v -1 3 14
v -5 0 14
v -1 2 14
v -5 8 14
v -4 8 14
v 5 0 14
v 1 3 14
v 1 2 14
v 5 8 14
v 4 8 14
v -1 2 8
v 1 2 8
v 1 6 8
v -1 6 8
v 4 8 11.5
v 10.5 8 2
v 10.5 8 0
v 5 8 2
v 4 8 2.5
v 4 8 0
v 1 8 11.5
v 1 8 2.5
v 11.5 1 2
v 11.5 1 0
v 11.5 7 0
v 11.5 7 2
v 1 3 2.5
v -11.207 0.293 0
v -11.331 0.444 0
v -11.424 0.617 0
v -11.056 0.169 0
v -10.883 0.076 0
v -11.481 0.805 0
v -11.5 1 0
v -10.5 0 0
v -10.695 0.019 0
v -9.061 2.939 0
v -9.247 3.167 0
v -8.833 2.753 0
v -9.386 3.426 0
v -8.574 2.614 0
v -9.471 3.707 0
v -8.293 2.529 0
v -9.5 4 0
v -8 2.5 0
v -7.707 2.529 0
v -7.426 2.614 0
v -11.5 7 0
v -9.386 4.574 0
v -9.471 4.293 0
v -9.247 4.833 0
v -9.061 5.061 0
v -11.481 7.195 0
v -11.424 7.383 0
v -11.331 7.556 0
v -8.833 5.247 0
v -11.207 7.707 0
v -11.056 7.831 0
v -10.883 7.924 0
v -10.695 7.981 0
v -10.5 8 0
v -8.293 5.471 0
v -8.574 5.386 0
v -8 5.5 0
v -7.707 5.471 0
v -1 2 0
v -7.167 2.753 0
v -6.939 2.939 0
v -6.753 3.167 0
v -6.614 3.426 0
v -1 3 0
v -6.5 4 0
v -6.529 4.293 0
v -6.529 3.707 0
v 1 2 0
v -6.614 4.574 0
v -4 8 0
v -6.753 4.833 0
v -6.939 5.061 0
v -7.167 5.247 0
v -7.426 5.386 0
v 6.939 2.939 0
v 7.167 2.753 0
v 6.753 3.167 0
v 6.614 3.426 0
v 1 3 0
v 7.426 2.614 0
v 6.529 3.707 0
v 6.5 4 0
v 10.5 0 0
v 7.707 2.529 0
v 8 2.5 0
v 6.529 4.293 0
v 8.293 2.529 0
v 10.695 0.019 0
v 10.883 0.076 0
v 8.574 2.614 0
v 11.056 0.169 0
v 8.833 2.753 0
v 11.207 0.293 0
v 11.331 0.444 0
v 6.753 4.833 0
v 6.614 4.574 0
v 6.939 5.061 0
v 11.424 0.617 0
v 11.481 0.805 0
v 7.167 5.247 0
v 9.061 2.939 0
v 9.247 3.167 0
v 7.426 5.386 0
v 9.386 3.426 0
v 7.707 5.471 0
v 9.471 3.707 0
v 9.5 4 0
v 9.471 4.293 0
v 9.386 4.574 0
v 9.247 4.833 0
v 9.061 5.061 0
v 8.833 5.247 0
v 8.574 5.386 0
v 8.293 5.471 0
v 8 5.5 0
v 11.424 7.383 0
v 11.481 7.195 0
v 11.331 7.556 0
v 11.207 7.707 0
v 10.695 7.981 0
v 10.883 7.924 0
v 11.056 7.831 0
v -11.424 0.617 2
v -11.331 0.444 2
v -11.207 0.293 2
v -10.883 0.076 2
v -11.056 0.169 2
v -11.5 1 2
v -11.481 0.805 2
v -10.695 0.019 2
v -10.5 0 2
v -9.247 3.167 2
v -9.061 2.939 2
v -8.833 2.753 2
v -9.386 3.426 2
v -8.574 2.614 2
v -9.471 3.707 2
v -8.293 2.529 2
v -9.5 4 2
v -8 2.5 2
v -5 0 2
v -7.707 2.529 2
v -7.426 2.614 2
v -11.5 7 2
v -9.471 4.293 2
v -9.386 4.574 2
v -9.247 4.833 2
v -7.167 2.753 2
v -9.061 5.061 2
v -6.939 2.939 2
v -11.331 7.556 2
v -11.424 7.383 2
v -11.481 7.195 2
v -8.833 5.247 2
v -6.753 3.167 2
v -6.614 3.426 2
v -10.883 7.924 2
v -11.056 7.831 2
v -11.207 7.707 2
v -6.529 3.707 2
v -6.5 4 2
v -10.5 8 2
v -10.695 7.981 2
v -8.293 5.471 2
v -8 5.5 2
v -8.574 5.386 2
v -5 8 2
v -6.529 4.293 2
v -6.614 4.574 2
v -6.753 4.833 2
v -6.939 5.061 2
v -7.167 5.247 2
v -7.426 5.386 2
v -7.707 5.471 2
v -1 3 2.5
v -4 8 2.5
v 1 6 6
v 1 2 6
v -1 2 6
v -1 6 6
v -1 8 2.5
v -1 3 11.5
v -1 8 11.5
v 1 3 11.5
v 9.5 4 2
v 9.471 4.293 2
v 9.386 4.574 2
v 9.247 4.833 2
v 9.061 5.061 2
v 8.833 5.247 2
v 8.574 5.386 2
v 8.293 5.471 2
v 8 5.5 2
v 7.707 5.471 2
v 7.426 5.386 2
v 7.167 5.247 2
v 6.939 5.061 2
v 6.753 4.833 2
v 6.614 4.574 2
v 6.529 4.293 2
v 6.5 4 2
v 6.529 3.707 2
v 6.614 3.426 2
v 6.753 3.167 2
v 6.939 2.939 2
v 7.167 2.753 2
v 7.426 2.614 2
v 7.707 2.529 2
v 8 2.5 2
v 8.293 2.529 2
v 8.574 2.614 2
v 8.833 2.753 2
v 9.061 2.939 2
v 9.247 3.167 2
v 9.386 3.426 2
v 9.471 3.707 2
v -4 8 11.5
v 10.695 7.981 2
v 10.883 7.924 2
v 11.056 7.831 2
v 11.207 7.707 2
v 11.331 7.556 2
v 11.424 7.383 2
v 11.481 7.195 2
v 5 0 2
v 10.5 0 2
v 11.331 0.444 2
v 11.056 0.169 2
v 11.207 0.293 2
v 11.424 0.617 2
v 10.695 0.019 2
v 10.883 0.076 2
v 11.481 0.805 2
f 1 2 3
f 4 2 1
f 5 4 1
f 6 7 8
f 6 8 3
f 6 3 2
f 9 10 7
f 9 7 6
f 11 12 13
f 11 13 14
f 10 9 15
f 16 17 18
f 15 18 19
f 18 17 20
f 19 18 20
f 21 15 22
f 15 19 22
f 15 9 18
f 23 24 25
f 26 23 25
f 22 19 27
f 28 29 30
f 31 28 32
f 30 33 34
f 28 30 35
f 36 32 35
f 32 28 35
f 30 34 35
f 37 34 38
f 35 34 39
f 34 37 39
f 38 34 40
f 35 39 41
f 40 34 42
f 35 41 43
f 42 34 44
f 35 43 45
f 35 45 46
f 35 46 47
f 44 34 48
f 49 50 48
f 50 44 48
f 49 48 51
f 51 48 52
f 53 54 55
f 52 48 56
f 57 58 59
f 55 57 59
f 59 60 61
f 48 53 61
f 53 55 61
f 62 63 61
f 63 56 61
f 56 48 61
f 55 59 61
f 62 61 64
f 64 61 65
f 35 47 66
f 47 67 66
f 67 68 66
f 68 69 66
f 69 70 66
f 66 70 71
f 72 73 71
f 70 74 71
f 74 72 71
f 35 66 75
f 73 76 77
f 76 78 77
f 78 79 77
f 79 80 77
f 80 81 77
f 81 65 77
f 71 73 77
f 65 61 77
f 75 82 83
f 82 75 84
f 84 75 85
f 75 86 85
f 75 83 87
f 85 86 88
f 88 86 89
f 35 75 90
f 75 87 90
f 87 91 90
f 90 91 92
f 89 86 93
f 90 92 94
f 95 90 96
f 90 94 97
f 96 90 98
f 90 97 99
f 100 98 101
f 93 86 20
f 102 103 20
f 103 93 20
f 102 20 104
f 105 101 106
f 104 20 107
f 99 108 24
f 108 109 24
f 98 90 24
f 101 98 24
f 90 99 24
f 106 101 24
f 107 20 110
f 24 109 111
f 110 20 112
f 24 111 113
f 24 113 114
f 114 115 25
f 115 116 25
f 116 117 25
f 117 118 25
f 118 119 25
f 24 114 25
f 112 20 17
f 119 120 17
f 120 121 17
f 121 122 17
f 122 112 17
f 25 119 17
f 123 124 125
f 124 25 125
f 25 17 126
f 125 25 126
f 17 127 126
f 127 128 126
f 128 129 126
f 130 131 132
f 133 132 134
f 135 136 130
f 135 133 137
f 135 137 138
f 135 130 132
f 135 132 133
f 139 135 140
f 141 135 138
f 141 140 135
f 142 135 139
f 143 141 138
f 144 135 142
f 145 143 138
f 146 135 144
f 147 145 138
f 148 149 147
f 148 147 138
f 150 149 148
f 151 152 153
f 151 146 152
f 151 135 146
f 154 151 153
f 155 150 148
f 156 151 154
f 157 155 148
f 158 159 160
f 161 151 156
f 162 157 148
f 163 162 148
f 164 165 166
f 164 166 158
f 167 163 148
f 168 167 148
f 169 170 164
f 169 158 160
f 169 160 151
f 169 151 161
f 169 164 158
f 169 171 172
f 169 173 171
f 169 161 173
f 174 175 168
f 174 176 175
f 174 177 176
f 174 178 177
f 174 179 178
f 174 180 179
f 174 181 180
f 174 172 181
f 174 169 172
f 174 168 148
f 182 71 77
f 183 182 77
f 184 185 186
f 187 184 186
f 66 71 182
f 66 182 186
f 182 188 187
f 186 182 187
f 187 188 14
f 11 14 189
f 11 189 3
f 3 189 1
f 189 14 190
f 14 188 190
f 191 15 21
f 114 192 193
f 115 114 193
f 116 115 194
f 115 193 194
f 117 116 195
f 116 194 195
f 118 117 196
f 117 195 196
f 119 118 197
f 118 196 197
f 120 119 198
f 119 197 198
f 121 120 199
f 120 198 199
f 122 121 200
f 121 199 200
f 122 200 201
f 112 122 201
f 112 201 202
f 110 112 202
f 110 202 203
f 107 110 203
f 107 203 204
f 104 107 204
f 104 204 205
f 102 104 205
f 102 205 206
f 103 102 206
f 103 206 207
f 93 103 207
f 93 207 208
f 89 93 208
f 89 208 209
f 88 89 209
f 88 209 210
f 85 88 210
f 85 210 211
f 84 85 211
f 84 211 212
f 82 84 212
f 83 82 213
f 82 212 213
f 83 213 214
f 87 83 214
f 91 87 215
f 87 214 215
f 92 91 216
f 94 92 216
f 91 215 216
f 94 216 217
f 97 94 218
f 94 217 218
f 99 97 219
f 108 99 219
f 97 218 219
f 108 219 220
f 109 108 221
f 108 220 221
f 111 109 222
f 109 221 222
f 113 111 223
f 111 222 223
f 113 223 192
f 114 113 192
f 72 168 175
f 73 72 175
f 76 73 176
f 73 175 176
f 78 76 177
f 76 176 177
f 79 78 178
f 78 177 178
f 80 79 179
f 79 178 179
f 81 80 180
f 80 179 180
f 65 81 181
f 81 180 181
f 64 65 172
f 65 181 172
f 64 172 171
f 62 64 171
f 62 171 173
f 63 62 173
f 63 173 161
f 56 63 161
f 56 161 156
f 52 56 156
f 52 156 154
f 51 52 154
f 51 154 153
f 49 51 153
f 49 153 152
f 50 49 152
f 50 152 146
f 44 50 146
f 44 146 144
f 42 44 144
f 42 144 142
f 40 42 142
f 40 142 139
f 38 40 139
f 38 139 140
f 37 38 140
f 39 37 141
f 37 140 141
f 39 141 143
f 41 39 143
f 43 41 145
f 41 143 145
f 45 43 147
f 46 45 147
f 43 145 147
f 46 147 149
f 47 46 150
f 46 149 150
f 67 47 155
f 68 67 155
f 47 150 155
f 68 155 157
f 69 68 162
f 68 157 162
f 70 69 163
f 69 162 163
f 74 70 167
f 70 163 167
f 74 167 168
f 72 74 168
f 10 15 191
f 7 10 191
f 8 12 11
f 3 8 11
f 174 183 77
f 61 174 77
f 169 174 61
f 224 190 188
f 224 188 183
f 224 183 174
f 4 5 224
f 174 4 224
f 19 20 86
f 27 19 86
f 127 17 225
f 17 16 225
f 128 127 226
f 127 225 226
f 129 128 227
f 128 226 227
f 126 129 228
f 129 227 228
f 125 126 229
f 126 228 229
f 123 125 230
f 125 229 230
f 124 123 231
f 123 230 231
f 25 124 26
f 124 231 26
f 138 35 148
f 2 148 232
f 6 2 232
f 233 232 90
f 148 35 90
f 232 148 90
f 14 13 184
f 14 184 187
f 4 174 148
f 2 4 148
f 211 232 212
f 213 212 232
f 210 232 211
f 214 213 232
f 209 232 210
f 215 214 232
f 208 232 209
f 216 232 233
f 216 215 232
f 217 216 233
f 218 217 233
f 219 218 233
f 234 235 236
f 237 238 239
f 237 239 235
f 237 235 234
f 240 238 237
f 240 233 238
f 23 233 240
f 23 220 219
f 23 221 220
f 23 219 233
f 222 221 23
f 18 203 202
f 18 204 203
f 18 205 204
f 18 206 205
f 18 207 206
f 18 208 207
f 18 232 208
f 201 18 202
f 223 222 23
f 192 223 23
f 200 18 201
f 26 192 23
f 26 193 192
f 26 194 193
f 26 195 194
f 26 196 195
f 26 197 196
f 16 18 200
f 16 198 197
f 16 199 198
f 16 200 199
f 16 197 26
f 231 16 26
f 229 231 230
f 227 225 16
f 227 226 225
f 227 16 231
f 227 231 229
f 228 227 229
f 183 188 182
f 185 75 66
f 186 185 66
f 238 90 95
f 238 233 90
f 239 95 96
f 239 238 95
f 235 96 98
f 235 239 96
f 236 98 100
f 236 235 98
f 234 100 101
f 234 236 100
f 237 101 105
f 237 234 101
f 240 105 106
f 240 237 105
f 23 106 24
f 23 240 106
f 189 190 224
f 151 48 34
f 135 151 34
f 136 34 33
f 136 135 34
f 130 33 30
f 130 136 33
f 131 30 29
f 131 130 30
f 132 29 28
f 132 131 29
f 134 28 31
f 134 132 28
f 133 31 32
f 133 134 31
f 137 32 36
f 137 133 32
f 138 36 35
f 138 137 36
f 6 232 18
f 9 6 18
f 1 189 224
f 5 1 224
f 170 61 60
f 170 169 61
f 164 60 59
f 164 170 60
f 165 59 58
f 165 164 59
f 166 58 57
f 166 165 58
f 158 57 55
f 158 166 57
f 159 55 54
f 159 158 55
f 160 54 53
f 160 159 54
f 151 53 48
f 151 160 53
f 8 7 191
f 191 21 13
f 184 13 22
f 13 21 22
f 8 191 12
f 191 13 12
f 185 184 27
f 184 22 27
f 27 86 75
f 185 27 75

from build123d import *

# Parameters (mm, degrees)
F1_DEPTH  = 2
F3_DEPTH  = 25
F4_R      = 1.5
F5_DEPTH  = 25
F7_DEPTH  = 12
F8_W      = 3
F8_H      = 9
F9_DEPTH  = 8
F10_W     = 2
F10_H     = 2
F11_DEPTH = 4
F12_R     = 1


with BuildPart() as f1:
    # F0 (on Top) → F1 (new body)
    with BuildSketch(Plane.XY):
        Polygon((-11.5, 8), (-11.5, 0), (11.5, 0), (11.5, 8), (1, 8), (1, 2), (-1, 2), (-1, 8), align=None)
    extrude(amount=F1_DEPTH)

    # F2 (on face) → F3 (cut)
    with BuildSketch(Plane.XY.offset(2)):
        Polygon((-1, 8), (-4, 8), (-1, 3), align=None)
        Polygon((1, 8), (1, 3), (4, 8), align=None)
    extrude(amount=-F3_DEPTH, mode=Mode.SUBTRACT)

    # F4 (on face) → F5 (cut)
    with BuildSketch(Plane.XY.offset(2)):
        with Locations((-8, 4)):
            Circle(F4_R)
        with Locations((8, 4)):
            Circle(F4_R)
    extrude(amount=-F5_DEPTH, mode=Mode.SUBTRACT)

    # F6 (on face) → F7 (join)
    with BuildSketch(Plane.XY.offset(2)):
        Polygon((-4, 8), (-5, 8), (-5, 0), (5, 0), (5, 8), (4, 8), (1, 3), (1, 2), (-1, 2), (-1, 3), align=None)
    extrude(amount=F7_DEPTH)

    # F8 (on face) → F9 (join)
    with BuildSketch(Plane(origin=(0, 8, 0), x_dir=(-1, 0, 0), z_dir=(0, 1, 0))):
        with Locations((2.5, 7)):
            Rectangle(F8_W, F8_H)
        with Locations((-2.5, 7)):
            Rectangle(F8_W, F8_H)
    extrude(amount=-F9_DEPTH)

    # F10 (on face) → F11 (join)
    with BuildSketch(Plane(origin=(0, 2, 0), x_dir=(-1, 0, 0), z_dir=(0, 1, 0))):
        with Locations((0, 7)):
            Rectangle(F10_W, F10_H)
    extrude(amount=F11_DEPTH)

    # F12
    f12_edges = [f1.edges().sort_by_distance(p)[0] for p in [
        (11.5, 8, 1),
        (11.5, 0, 1),
        (-11.5, 0, 1),
        (-11.5, 8, 1),
    ]]
    fillet(f12_edges, radius=F12_R)


solid = f1.part
